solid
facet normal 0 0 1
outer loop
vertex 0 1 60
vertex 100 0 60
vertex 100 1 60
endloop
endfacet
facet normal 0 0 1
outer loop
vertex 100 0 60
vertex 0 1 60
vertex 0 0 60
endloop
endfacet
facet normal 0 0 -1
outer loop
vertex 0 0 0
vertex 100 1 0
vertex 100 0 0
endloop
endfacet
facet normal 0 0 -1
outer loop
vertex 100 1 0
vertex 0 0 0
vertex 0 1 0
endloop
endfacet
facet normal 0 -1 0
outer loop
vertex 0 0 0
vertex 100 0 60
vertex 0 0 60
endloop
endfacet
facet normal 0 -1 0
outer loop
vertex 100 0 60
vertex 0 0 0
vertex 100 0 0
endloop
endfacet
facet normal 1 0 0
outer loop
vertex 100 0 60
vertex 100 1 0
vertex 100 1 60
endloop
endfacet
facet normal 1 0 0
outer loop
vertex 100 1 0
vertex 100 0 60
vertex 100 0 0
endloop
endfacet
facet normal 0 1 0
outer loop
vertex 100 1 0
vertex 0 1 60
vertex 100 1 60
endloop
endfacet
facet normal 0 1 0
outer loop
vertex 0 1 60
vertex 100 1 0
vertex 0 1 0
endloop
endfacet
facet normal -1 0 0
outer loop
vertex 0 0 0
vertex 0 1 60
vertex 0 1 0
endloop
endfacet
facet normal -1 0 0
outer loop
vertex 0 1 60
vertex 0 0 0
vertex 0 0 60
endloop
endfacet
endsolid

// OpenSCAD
// Volumen de referencia para placa láser 100 × 60 × 1 mm
color([0.1,0.1,0.1]) cube([100,1,60]);
